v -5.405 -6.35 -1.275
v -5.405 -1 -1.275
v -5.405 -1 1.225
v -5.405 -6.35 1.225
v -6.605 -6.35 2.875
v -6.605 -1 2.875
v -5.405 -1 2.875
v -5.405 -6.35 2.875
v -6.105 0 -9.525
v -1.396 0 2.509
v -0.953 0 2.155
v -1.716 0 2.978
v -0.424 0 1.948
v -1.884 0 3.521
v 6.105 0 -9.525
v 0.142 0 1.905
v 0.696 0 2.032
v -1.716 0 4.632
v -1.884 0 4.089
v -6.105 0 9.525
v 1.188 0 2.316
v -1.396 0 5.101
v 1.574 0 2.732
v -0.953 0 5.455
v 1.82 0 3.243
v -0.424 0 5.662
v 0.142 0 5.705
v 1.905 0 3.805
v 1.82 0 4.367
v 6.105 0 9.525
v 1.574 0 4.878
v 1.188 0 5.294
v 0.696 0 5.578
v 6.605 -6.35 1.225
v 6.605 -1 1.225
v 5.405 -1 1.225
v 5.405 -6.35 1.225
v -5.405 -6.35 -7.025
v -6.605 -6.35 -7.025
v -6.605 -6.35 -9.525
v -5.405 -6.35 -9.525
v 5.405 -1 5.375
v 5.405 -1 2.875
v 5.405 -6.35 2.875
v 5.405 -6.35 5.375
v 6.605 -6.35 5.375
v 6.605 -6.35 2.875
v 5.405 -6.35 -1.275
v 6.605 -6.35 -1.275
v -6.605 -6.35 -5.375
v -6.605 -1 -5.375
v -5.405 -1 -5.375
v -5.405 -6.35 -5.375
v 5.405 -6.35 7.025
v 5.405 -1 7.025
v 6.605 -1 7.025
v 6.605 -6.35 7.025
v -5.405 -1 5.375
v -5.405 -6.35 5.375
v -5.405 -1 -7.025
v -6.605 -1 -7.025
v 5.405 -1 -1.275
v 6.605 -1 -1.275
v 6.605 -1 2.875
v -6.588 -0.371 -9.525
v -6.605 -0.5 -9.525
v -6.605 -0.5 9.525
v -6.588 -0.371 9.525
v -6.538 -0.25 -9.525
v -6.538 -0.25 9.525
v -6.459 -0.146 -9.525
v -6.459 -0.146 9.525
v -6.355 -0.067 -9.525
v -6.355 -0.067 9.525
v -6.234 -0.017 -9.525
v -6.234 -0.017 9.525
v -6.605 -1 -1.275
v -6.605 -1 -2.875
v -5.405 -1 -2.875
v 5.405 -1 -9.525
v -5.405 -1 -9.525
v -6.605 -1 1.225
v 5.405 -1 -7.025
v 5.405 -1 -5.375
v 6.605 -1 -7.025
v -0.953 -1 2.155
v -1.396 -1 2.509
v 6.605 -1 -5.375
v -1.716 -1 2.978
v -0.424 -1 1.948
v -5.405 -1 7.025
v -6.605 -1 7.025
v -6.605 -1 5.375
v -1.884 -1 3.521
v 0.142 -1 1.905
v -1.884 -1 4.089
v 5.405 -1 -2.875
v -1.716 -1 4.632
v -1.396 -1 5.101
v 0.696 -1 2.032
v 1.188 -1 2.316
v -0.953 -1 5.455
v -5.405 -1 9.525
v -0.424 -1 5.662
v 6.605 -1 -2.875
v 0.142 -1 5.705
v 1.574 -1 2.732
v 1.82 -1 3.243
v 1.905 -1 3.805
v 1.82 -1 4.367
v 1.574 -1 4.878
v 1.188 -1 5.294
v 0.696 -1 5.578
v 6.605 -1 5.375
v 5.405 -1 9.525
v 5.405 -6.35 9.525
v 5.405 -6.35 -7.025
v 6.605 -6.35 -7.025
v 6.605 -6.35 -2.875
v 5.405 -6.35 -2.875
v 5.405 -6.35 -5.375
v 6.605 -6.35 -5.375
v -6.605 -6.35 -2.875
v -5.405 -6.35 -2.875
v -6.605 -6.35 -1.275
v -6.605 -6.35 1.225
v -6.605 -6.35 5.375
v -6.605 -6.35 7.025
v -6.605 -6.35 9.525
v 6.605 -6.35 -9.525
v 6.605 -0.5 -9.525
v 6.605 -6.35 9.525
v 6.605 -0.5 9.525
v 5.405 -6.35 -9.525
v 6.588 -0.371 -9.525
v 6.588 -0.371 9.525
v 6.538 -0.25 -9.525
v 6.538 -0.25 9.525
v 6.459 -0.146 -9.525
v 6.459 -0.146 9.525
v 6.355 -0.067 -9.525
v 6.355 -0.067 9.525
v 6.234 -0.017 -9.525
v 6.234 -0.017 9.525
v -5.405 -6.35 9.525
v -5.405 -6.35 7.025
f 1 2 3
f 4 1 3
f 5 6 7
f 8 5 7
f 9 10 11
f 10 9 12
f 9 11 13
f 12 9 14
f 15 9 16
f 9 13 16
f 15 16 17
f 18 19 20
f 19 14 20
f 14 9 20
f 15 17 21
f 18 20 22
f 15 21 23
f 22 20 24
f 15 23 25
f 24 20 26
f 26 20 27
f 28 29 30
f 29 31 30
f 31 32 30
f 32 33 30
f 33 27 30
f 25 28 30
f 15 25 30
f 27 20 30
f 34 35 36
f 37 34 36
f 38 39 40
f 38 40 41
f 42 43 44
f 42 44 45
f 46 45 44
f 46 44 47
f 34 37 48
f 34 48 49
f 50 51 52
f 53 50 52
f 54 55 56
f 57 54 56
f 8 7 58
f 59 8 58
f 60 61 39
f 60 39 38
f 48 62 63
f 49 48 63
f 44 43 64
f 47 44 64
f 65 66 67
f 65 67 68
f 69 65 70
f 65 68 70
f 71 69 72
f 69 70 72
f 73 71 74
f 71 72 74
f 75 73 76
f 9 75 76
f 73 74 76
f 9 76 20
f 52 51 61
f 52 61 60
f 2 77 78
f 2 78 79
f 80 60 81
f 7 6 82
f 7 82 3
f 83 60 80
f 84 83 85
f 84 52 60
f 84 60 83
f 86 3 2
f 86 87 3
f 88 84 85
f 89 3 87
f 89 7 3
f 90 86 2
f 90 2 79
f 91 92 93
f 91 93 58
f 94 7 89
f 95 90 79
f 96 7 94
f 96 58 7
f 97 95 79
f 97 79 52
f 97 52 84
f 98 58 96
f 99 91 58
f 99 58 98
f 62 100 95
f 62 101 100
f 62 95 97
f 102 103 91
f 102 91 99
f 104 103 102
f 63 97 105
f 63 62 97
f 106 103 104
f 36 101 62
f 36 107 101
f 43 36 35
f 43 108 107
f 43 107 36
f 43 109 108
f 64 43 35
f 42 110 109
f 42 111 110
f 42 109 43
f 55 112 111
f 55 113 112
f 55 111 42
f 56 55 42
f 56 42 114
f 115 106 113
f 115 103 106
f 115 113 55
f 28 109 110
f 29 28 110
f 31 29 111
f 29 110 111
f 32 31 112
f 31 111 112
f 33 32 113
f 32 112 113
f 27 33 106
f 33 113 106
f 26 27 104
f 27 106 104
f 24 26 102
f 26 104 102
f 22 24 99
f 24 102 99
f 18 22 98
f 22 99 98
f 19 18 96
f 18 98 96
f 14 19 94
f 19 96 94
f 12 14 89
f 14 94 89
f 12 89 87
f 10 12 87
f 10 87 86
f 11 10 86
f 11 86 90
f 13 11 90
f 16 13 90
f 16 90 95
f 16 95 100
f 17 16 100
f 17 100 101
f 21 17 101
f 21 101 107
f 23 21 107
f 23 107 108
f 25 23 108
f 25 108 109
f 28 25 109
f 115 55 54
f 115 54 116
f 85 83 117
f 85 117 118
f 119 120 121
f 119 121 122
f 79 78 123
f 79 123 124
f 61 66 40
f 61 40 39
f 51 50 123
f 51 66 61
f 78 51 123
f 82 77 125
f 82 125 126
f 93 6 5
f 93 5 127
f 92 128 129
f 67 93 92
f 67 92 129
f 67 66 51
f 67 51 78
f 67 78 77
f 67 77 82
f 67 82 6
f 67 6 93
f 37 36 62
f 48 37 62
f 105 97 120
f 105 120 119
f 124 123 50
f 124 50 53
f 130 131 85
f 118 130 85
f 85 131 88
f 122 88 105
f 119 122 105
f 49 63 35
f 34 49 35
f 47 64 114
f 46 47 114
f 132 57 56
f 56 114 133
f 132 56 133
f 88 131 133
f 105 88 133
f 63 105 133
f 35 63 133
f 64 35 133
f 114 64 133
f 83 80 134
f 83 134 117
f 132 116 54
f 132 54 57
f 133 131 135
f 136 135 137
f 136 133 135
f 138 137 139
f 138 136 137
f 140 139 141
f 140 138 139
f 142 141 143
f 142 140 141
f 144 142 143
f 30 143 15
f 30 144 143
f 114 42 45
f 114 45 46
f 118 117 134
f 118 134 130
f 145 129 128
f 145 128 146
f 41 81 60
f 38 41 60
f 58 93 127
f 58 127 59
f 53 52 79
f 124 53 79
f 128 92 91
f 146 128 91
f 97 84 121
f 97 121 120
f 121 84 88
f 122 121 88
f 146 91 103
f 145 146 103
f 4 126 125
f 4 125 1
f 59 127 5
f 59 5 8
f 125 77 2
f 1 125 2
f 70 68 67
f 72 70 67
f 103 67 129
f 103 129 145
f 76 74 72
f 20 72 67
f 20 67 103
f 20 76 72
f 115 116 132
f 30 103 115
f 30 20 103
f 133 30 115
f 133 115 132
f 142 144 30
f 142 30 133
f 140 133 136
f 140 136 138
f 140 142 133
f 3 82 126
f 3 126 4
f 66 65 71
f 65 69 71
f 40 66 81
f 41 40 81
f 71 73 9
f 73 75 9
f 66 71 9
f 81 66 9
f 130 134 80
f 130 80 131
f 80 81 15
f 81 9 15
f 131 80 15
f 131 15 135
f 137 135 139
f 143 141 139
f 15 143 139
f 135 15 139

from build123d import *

# Parameters (mm, degrees)
F0_W     = 13.21
F0_H     = 19.05
F1_DEPTH = 1
F2_W     = 1.2
F2_H     = 2.5
F3_DEPTH = 5.35
F4_R     = 0.5
F6_D     = 3.81


with BuildPart() as f1:
    # F0 (on Front) → F1 (new body)
    with BuildSketch(Plane.XZ):
        Rectangle(F0_W, F0_H)
    extrude(amount=F1_DEPTH)

    # F2 (on face) → F3 (join)
    with BuildSketch(Plane.XZ.offset(1)):
        with Locations((6.005, 8.275)):
            Rectangle(F2_W, F2_H)
        with Locations((6.005, 4.125)):
            Rectangle(F2_W, F2_H)
        Polygon((6.605, -1.275), (6.605, 1.225), (5.405, 1.225), (5.405, -1.225), (5.405, -1.275), align=None)
        with Locations((6.005, -4.125)):
            Rectangle(F2_W, F2_H)
        with Locations((6.005, -8.275)):
            Rectangle(F2_W, F2_H)
        with Locations((-6.005, 8.275)):
            Rectangle(F2_W, F2_H)
        with Locations((-6.005, 4.125)):
            Rectangle(F2_W, F2_H)
        with Locations((-6.005, -0.025)):
            Rectangle(F2_W, F2_H)
        with Locations((-6.005, -4.125)):
            Rectangle(F2_W, F2_H)
        with Locations((-6.005, -8.275)):
            Rectangle(F2_W, F2_H)
    extrude(amount=F3_DEPTH)

    # F4
    f4_edges = [f1.edges().sort_by_distance(p)[0] for p in [
        (6.605, 0, 0),
        (-6.605, 0, 0),
    ]]
    fillet(f4_edges, radius=F4_R)

    # F6 (through all)
    with Locations(Plane(origin=(0, 0, 0), x_dir=(-1, 0, 0), z_dir=(0, 1, 0))):
        with Locations((0, 3.805)):
            Hole(F6_D / 2)


solid = f1.part
